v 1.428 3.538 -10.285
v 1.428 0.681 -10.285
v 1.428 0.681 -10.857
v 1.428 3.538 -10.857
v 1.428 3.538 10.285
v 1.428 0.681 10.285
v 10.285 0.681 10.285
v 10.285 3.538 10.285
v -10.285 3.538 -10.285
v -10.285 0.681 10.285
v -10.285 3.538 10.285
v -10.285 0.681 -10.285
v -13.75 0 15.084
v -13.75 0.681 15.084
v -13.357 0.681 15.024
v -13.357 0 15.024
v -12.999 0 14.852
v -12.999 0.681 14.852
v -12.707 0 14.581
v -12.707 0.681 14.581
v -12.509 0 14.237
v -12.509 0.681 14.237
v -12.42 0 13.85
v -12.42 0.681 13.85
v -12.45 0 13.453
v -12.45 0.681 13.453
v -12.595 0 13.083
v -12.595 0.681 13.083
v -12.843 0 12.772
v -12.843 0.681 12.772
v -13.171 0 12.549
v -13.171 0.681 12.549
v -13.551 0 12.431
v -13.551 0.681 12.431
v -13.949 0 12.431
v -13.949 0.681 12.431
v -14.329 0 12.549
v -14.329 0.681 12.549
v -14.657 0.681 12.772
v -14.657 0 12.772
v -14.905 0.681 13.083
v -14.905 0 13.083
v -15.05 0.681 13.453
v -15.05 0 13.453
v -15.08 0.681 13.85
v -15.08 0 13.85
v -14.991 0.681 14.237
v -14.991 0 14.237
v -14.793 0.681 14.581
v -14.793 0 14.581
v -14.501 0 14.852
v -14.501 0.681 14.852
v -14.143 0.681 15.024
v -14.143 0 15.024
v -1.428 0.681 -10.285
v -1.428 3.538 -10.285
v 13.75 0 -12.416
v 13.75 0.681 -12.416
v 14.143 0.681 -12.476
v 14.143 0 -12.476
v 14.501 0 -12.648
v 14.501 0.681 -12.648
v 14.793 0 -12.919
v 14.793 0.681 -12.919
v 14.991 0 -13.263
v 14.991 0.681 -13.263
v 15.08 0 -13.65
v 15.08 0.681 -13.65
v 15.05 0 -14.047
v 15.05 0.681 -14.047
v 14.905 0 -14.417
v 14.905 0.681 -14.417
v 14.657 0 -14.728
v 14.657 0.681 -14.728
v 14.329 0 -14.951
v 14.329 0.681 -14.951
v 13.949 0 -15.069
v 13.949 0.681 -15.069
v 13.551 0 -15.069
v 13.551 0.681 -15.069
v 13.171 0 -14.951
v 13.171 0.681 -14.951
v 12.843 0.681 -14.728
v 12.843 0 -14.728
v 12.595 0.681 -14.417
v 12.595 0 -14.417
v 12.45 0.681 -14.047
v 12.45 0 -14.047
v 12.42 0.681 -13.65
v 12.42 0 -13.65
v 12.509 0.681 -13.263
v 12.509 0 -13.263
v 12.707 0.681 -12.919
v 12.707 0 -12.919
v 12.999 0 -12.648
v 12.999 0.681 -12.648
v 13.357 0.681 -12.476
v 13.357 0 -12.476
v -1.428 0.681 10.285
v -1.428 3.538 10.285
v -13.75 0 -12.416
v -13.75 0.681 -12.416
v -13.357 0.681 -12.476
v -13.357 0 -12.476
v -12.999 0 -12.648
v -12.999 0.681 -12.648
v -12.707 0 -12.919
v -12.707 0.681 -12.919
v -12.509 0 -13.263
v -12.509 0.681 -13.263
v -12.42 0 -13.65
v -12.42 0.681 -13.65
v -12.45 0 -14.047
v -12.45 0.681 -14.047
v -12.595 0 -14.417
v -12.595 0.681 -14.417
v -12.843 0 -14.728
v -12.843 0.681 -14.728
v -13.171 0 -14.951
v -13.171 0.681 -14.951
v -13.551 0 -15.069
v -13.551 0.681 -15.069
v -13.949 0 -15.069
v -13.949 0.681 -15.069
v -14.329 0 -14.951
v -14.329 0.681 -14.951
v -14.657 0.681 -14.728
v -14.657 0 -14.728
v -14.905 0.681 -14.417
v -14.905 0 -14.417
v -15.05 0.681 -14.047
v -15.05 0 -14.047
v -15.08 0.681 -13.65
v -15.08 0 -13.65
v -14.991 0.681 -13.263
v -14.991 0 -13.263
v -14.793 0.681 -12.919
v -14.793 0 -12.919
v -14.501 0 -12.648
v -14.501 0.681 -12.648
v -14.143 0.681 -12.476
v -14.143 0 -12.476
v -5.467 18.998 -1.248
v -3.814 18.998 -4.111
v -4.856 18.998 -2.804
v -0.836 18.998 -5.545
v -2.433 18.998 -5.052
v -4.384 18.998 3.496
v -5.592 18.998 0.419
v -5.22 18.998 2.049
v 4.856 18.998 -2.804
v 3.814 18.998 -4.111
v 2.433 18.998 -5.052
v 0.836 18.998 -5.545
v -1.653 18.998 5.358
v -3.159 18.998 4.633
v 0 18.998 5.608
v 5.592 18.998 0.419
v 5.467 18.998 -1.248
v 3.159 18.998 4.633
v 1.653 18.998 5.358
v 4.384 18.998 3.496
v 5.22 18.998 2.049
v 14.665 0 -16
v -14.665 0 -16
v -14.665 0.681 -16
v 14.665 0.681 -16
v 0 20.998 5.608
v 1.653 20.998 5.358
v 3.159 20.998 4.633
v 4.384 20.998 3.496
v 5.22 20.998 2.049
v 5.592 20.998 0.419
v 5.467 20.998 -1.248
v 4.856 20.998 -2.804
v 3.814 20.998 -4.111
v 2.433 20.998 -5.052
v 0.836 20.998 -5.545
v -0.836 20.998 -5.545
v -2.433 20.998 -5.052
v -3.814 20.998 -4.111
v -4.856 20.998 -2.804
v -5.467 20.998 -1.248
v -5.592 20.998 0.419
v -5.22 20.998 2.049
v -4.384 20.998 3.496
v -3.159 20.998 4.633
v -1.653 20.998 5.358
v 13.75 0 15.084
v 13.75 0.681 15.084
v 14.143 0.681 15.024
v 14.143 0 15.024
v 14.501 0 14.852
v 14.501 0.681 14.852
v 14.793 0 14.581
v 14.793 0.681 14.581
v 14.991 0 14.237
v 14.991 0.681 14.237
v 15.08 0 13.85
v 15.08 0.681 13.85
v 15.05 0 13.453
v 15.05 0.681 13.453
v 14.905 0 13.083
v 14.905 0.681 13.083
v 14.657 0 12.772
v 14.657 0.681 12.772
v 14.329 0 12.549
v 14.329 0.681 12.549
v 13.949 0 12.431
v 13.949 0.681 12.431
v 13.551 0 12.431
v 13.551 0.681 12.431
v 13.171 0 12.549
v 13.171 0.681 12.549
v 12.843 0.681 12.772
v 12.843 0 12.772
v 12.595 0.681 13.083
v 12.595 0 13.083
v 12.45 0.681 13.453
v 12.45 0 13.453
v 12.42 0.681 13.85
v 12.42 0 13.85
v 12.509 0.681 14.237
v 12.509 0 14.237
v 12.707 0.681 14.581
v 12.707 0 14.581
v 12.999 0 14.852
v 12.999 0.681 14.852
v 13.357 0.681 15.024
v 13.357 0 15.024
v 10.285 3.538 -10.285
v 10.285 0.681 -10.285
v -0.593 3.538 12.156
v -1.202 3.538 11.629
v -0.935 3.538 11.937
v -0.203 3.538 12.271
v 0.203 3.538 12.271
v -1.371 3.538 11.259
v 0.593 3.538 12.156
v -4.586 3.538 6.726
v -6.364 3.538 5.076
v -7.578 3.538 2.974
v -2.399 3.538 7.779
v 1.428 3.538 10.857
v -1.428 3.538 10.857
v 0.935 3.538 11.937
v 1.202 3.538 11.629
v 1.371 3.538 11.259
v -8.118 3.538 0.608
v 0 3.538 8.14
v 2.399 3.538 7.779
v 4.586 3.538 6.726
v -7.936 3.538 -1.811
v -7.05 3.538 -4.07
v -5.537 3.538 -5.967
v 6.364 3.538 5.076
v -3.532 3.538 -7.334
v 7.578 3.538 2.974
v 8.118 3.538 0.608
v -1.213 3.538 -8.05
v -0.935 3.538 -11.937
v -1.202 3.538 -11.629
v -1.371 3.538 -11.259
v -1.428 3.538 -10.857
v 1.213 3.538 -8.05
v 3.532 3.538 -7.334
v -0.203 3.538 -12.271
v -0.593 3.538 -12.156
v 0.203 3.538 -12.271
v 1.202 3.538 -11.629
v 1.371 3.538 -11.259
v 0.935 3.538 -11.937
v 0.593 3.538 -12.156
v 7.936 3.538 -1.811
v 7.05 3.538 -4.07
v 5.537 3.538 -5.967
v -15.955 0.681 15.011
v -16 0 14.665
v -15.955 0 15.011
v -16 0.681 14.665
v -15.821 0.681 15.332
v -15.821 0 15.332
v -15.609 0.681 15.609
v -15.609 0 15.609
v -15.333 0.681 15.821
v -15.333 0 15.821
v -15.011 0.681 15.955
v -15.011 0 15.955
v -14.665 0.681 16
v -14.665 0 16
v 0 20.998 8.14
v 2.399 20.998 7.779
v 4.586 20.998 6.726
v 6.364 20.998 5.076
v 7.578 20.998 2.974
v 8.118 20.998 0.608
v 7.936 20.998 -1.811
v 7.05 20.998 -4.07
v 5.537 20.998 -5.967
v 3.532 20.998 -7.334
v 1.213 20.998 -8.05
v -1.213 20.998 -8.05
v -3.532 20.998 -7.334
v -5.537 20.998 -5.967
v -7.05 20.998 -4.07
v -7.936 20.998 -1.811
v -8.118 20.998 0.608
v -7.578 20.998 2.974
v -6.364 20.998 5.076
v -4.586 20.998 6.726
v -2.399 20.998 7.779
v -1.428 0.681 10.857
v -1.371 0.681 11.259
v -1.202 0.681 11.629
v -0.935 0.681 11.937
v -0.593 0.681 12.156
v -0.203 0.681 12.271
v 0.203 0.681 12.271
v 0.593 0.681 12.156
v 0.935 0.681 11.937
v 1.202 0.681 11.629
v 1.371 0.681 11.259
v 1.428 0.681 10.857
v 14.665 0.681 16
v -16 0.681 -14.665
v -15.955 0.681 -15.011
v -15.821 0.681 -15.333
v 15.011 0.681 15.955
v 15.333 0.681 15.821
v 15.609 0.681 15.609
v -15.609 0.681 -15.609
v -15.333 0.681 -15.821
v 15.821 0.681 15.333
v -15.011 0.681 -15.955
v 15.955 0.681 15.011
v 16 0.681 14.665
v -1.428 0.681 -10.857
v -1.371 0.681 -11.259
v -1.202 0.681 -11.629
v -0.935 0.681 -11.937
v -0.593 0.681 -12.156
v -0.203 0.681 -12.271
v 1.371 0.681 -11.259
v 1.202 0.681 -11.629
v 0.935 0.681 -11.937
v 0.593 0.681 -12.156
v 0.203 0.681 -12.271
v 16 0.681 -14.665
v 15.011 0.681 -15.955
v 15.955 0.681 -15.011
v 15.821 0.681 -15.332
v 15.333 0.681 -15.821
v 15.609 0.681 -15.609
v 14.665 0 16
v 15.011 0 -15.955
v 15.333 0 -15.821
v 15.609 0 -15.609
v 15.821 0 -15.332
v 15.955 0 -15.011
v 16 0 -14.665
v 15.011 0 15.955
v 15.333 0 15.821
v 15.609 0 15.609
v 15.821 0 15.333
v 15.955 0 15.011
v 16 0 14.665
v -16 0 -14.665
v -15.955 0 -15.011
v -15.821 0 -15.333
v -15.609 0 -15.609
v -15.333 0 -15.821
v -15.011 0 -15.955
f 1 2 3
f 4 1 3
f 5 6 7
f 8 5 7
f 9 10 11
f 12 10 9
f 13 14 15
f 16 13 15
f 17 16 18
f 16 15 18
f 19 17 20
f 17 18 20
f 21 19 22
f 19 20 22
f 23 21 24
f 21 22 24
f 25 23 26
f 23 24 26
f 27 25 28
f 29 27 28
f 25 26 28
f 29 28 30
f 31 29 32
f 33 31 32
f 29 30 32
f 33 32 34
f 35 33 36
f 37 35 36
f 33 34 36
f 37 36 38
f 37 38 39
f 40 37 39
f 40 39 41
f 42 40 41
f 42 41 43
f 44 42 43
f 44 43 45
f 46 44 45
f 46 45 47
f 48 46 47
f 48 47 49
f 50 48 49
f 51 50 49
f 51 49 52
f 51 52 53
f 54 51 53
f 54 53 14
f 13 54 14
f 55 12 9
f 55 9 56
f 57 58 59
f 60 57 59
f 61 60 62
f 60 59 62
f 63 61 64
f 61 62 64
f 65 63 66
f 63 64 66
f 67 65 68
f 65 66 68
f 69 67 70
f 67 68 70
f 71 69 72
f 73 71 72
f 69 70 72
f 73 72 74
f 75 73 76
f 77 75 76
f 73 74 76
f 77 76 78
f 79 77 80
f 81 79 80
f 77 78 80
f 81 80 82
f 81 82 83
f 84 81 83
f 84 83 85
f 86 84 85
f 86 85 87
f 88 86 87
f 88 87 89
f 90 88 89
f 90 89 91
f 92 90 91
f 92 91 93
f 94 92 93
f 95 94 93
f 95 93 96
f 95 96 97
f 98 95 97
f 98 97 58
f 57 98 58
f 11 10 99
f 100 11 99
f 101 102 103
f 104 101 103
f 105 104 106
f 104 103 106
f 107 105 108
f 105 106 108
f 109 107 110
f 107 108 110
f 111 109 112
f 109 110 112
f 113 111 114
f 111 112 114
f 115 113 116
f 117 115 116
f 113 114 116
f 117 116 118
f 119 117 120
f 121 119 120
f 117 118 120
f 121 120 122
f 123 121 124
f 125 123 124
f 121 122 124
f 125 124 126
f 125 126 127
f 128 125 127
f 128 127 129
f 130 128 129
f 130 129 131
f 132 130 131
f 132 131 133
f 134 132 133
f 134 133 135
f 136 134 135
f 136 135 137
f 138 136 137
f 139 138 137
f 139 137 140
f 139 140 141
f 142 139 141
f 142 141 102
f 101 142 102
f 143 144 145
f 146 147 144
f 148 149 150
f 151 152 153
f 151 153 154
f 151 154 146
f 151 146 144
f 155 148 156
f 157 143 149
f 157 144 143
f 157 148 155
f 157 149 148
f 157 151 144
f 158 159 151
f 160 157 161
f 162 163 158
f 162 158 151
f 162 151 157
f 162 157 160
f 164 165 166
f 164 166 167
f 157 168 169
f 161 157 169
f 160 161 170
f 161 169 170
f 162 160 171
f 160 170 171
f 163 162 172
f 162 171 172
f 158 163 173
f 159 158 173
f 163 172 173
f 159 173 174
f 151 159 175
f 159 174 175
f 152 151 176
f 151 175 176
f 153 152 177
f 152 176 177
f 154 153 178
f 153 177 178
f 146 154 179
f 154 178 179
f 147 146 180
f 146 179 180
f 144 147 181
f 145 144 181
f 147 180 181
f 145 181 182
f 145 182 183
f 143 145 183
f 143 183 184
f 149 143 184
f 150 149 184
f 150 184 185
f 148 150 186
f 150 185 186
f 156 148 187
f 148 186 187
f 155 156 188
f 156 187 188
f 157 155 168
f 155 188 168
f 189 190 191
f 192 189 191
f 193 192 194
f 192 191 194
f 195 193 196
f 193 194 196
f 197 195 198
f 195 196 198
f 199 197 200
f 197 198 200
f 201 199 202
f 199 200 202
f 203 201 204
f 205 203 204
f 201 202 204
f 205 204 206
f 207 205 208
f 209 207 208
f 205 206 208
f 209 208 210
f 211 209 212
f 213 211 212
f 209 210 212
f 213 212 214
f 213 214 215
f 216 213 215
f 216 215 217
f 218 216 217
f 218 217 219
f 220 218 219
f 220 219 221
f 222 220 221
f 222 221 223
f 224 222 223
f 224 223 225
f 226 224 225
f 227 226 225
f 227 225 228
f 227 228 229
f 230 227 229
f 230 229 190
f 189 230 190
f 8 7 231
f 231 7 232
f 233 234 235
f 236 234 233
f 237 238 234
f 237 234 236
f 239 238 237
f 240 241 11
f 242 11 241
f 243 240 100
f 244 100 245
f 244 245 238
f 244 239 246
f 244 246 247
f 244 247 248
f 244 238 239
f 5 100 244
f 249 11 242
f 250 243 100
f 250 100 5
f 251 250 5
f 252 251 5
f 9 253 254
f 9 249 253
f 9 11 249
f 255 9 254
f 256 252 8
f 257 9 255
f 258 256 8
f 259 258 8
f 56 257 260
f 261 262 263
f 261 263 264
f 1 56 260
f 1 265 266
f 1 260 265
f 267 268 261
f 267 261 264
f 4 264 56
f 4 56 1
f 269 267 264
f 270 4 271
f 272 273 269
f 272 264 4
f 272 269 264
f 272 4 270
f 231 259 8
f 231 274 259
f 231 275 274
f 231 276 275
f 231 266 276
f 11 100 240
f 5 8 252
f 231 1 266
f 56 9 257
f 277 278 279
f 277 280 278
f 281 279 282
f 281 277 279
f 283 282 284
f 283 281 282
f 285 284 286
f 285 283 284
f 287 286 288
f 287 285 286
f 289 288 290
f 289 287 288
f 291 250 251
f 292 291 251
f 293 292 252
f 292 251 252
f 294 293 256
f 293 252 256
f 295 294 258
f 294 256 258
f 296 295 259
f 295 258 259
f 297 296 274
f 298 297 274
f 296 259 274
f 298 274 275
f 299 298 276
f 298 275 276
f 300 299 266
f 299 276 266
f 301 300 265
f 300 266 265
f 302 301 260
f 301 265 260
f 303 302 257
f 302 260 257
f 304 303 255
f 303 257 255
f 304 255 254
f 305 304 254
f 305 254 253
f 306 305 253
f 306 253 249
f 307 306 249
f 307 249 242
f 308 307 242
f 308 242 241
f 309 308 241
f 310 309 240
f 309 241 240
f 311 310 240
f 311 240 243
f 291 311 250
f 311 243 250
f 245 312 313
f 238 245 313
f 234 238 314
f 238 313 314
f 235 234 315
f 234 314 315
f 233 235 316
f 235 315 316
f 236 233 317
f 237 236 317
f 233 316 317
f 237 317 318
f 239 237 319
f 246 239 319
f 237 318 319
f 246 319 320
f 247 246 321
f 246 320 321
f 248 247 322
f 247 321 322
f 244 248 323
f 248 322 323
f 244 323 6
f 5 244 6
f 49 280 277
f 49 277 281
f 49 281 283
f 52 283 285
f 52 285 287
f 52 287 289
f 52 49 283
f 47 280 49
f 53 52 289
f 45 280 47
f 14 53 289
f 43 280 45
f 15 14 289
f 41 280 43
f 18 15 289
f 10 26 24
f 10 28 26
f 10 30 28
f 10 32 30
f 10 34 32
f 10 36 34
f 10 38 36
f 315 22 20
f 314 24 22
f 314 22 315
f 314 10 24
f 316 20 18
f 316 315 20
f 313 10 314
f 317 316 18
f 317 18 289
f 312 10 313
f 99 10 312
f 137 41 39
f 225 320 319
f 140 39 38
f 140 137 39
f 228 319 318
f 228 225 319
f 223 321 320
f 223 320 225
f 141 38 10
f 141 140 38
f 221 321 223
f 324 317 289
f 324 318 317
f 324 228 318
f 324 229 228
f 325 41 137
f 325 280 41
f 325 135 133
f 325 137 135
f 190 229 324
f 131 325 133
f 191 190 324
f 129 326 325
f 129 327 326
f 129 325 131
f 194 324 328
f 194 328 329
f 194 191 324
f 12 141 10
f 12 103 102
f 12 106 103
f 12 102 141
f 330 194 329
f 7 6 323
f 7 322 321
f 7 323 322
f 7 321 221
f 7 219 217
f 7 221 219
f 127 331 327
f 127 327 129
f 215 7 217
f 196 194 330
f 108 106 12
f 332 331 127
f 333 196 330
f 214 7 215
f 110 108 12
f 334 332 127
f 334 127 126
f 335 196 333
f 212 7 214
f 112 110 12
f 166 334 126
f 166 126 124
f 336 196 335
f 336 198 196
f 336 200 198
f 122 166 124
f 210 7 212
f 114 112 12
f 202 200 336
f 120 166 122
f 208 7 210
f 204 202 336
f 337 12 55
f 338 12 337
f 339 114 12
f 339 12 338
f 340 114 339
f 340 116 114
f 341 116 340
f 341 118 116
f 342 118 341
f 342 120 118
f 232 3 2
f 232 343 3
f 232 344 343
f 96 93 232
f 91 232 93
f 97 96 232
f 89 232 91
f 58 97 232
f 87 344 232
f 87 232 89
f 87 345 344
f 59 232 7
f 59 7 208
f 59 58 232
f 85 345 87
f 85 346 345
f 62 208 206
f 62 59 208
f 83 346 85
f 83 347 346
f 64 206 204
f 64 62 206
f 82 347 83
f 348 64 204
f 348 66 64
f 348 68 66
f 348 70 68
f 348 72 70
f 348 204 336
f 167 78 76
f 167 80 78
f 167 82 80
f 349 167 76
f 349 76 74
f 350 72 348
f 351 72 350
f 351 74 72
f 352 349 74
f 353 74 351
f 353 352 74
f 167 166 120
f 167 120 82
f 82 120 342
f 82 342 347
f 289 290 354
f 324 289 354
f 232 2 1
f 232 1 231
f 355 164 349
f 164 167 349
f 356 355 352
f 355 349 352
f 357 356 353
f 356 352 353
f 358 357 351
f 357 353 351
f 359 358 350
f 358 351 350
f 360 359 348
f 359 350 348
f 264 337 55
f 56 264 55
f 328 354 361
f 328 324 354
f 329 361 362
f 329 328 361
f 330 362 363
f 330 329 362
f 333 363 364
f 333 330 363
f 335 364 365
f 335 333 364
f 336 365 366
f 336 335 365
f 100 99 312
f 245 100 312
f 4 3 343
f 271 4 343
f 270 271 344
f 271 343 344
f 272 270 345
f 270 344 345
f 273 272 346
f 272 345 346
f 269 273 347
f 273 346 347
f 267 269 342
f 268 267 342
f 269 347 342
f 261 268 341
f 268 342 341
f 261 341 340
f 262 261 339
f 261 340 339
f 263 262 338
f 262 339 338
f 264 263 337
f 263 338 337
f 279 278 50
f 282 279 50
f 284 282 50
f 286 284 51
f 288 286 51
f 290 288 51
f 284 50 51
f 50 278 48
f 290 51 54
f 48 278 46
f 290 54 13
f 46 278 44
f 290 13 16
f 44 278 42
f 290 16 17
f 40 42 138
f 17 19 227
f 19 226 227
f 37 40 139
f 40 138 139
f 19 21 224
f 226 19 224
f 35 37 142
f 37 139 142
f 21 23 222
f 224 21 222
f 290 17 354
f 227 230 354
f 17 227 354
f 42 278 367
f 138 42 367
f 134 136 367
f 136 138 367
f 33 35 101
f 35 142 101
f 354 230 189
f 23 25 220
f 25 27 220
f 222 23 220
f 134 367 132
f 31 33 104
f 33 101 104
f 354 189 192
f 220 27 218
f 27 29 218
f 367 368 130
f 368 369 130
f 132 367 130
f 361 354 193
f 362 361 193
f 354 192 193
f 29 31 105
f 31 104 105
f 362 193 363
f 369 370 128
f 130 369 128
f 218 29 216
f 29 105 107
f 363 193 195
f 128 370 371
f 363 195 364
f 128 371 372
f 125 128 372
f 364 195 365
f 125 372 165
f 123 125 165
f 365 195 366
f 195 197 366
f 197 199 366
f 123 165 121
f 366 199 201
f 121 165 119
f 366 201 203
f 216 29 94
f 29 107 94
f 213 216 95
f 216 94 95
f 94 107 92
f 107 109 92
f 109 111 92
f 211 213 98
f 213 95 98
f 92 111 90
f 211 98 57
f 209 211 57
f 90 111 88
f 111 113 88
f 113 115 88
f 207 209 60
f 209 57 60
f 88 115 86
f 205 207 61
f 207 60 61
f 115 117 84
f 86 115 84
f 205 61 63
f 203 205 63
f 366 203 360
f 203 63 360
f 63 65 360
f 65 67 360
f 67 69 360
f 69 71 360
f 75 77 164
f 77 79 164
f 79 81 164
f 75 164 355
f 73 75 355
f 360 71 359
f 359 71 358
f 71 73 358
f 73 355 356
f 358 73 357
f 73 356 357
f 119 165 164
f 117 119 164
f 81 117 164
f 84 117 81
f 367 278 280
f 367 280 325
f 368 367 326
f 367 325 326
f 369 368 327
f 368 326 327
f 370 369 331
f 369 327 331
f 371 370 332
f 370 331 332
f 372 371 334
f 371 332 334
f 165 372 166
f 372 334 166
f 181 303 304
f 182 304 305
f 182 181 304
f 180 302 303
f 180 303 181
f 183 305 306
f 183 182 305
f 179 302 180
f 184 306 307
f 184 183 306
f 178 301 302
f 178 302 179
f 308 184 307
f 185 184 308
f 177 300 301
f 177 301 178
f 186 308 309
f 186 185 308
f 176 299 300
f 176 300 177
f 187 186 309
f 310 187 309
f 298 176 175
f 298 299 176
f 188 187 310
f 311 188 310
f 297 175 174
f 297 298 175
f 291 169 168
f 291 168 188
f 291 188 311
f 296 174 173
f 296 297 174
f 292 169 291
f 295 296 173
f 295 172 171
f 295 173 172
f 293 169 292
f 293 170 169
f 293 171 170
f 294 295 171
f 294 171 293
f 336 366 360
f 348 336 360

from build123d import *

# Parameters (mm, degrees)
SKETCH1_W           = 32
SKETCH1_H           = 32
BOSS_EXTRUDE1_DEPTH = 0.681
SKETCH2_R           = 1.3335
CUT_EXTRUDE1_DEPTH  = 1
FILLET1_R           = 1.335
SKETCH3_R           = 1.4285
SKETCH3_W           = 20.57
SKETCH3_H           = 20.57
BOSS_EXTRUDE2_DEPTH = 2.857
SKETCH4_R           = 8.1405
BOSS_EXTRUDE3_DEPTH = 17.46
SKETCH6_R           = 5.6075
CUT_EXTRUDE2_DEPTH  = 2


with BuildPart() as part:
    # Sketch1 → Boss-Extrude1 (new body)
    with BuildSketch(Plane(origin=(0, 0, 0), x_dir=(1, 0, 0), z_dir=(0, 1, 0))):
        Rectangle(SKETCH1_W, SKETCH1_H)
    extrude(amount=BOSS_EXTRUDE1_DEPTH)

    # Sketch2 → Cut-Extrude1 (cut)
    with BuildSketch(Plane(origin=(0, 0.681, 0), x_dir=(1, 0, 0), z_dir=(0, 1, 0))):
        with Locations(Location((13.75, 13.75, 0), (0, 0, 270))):
            Circle(SKETCH2_R)
        with Locations(Location((-13.75, 13.75, 0), (0, 0, 270))):
            Circle(SKETCH2_R)
        with Locations(Location((-13.75, -13.75, 0), (0, 0, 270))):
            Circle(SKETCH2_R)
        with Locations(Location((13.75, -13.75, 0), (0, 0, 270))):
            Circle(SKETCH2_R)
    extrude(amount=-CUT_EXTRUDE1_DEPTH, mode=Mode.SUBTRACT)

    # Fillet1
    fillet1_edges = [part.edges().sort_by_distance(p)[0] for p in [
        (16, 0.3405, 16),
        (-16, 0.3405, 16),
        (-16, 0.3405, -16),
        (16, 0.3405, -16),
    ]]
    fillet(fillet1_edges, radius=FILLET1_R)

    # Sketch3 → Boss-Extrude2 (add)
    with BuildSketch(Plane(origin=(0, 0.681, 0), x_dir=(1, 0, 0), z_dir=(0, 1, 0))):
        with Locations((0, -10.857)):
            Circle(SKETCH3_R)
        with Locations((0, 10.857)):
            Circle(SKETCH3_R)
        Rectangle(SKETCH3_W, SKETCH3_H)
        with BuildLine():
            ThreePointArc((1.308979851, -10.285), (0, -9.4285), (-1.308979851, -10.285))
            Line((-1.308979851, -10.285), (1.308979851, -10.285))
        make_face()
        with BuildLine():
            Line((1.308979851, -10.285), (-1.308979851, -10.285))
            ThreePointArc((-1.308979851, -10.285), (-1.398300749, -10.564823227), (-1.4285, -10.857))
            ThreePointArc((-1.4285, -10.857), (0, -12.2855), (1.4285, -10.857))
            ThreePointArc((1.4285, -10.857), (1.398300749, -10.564823227), (1.308979851, -10.285))
        make_face()
        with BuildLine():
            Line((1.4285, -10.285), (1.308979851, -10.285))
            ThreePointArc((1.308979851, -10.285), (1.398300749, -10.564823227), (1.4285, -10.857))
            Line((1.4285, -10.857), (1.4285, -10.285))
        make_face()
        with BuildLine():
            Line((-1.308979851, -10.285), (-1.4285, -10.285))
            Line((-1.4285, -10.285), (-1.4285, -10.857))
            ThreePointArc((-1.4285, -10.857), (-1.398300749, -10.564823227), (-1.308979851, -10.285))
        make_face()
        with BuildLine():
            ThreePointArc((-1.4285, 10.857), (-1.398300749, 10.564823227), (-1.308979851, 10.285))
            Line((-1.308979851, 10.285), (1.308979851, 10.285))
            ThreePointArc((1.308979851, 10.285), (1.398300749, 10.564823227), (1.4285, 10.857))
            ThreePointArc((1.4285, 10.857), (0, 12.2855), (-1.4285, 10.857))
        make_face()
        with BuildLine():
            Line((1.308979851, 10.285), (-1.308979851, 10.285))
            ThreePointArc((-1.308979851, 10.285), (0, 9.4285), (1.308979851, 10.285))
        make_face()
        with BuildLine():
            ThreePointArc((1.4285, 10.857), (1.398300749, 10.564823227), (1.308979851, 10.285))
            Line((1.308979851, 10.285), (1.4285, 10.285))
            Line((1.4285, 10.285), (1.4285, 10.857))
        make_face()
        with BuildLine():
            Line((-1.4285, 10.857), (-1.4285, 10.285))
            Line((-1.4285, 10.285), (-1.308979851, 10.285))
            ThreePointArc((-1.308979851, 10.285), (-1.398300749, 10.564823227), (-1.4285, 10.857))
        make_face()
    extrude(amount=BOSS_EXTRUDE2_DEPTH)

    # Sketch4 → Boss-Extrude3 (add)
    with BuildSketch(Plane(origin=(0, 3.538, 0), x_dir=(1, 0, 0), z_dir=(0, 1, 0))):
        with Locations(Location((0, 0, 0), (0, 0, 270))):
            Circle(SKETCH4_R)
    extrude(amount=BOSS_EXTRUDE3_DEPTH)

    # Sketch6 → Cut-Extrude2 (cut)
    with BuildSketch(Plane(origin=(0, 20.998, 0), x_dir=(1, 0, 0), z_dir=(0, 1, 0))):
        with Locations(Location((0, 0, 0), (0, 0, 270))):
            Circle(SKETCH6_R)
    extrude(amount=-CUT_EXTRUDE2_DEPTH, mode=Mode.SUBTRACT)


solid = part.part
